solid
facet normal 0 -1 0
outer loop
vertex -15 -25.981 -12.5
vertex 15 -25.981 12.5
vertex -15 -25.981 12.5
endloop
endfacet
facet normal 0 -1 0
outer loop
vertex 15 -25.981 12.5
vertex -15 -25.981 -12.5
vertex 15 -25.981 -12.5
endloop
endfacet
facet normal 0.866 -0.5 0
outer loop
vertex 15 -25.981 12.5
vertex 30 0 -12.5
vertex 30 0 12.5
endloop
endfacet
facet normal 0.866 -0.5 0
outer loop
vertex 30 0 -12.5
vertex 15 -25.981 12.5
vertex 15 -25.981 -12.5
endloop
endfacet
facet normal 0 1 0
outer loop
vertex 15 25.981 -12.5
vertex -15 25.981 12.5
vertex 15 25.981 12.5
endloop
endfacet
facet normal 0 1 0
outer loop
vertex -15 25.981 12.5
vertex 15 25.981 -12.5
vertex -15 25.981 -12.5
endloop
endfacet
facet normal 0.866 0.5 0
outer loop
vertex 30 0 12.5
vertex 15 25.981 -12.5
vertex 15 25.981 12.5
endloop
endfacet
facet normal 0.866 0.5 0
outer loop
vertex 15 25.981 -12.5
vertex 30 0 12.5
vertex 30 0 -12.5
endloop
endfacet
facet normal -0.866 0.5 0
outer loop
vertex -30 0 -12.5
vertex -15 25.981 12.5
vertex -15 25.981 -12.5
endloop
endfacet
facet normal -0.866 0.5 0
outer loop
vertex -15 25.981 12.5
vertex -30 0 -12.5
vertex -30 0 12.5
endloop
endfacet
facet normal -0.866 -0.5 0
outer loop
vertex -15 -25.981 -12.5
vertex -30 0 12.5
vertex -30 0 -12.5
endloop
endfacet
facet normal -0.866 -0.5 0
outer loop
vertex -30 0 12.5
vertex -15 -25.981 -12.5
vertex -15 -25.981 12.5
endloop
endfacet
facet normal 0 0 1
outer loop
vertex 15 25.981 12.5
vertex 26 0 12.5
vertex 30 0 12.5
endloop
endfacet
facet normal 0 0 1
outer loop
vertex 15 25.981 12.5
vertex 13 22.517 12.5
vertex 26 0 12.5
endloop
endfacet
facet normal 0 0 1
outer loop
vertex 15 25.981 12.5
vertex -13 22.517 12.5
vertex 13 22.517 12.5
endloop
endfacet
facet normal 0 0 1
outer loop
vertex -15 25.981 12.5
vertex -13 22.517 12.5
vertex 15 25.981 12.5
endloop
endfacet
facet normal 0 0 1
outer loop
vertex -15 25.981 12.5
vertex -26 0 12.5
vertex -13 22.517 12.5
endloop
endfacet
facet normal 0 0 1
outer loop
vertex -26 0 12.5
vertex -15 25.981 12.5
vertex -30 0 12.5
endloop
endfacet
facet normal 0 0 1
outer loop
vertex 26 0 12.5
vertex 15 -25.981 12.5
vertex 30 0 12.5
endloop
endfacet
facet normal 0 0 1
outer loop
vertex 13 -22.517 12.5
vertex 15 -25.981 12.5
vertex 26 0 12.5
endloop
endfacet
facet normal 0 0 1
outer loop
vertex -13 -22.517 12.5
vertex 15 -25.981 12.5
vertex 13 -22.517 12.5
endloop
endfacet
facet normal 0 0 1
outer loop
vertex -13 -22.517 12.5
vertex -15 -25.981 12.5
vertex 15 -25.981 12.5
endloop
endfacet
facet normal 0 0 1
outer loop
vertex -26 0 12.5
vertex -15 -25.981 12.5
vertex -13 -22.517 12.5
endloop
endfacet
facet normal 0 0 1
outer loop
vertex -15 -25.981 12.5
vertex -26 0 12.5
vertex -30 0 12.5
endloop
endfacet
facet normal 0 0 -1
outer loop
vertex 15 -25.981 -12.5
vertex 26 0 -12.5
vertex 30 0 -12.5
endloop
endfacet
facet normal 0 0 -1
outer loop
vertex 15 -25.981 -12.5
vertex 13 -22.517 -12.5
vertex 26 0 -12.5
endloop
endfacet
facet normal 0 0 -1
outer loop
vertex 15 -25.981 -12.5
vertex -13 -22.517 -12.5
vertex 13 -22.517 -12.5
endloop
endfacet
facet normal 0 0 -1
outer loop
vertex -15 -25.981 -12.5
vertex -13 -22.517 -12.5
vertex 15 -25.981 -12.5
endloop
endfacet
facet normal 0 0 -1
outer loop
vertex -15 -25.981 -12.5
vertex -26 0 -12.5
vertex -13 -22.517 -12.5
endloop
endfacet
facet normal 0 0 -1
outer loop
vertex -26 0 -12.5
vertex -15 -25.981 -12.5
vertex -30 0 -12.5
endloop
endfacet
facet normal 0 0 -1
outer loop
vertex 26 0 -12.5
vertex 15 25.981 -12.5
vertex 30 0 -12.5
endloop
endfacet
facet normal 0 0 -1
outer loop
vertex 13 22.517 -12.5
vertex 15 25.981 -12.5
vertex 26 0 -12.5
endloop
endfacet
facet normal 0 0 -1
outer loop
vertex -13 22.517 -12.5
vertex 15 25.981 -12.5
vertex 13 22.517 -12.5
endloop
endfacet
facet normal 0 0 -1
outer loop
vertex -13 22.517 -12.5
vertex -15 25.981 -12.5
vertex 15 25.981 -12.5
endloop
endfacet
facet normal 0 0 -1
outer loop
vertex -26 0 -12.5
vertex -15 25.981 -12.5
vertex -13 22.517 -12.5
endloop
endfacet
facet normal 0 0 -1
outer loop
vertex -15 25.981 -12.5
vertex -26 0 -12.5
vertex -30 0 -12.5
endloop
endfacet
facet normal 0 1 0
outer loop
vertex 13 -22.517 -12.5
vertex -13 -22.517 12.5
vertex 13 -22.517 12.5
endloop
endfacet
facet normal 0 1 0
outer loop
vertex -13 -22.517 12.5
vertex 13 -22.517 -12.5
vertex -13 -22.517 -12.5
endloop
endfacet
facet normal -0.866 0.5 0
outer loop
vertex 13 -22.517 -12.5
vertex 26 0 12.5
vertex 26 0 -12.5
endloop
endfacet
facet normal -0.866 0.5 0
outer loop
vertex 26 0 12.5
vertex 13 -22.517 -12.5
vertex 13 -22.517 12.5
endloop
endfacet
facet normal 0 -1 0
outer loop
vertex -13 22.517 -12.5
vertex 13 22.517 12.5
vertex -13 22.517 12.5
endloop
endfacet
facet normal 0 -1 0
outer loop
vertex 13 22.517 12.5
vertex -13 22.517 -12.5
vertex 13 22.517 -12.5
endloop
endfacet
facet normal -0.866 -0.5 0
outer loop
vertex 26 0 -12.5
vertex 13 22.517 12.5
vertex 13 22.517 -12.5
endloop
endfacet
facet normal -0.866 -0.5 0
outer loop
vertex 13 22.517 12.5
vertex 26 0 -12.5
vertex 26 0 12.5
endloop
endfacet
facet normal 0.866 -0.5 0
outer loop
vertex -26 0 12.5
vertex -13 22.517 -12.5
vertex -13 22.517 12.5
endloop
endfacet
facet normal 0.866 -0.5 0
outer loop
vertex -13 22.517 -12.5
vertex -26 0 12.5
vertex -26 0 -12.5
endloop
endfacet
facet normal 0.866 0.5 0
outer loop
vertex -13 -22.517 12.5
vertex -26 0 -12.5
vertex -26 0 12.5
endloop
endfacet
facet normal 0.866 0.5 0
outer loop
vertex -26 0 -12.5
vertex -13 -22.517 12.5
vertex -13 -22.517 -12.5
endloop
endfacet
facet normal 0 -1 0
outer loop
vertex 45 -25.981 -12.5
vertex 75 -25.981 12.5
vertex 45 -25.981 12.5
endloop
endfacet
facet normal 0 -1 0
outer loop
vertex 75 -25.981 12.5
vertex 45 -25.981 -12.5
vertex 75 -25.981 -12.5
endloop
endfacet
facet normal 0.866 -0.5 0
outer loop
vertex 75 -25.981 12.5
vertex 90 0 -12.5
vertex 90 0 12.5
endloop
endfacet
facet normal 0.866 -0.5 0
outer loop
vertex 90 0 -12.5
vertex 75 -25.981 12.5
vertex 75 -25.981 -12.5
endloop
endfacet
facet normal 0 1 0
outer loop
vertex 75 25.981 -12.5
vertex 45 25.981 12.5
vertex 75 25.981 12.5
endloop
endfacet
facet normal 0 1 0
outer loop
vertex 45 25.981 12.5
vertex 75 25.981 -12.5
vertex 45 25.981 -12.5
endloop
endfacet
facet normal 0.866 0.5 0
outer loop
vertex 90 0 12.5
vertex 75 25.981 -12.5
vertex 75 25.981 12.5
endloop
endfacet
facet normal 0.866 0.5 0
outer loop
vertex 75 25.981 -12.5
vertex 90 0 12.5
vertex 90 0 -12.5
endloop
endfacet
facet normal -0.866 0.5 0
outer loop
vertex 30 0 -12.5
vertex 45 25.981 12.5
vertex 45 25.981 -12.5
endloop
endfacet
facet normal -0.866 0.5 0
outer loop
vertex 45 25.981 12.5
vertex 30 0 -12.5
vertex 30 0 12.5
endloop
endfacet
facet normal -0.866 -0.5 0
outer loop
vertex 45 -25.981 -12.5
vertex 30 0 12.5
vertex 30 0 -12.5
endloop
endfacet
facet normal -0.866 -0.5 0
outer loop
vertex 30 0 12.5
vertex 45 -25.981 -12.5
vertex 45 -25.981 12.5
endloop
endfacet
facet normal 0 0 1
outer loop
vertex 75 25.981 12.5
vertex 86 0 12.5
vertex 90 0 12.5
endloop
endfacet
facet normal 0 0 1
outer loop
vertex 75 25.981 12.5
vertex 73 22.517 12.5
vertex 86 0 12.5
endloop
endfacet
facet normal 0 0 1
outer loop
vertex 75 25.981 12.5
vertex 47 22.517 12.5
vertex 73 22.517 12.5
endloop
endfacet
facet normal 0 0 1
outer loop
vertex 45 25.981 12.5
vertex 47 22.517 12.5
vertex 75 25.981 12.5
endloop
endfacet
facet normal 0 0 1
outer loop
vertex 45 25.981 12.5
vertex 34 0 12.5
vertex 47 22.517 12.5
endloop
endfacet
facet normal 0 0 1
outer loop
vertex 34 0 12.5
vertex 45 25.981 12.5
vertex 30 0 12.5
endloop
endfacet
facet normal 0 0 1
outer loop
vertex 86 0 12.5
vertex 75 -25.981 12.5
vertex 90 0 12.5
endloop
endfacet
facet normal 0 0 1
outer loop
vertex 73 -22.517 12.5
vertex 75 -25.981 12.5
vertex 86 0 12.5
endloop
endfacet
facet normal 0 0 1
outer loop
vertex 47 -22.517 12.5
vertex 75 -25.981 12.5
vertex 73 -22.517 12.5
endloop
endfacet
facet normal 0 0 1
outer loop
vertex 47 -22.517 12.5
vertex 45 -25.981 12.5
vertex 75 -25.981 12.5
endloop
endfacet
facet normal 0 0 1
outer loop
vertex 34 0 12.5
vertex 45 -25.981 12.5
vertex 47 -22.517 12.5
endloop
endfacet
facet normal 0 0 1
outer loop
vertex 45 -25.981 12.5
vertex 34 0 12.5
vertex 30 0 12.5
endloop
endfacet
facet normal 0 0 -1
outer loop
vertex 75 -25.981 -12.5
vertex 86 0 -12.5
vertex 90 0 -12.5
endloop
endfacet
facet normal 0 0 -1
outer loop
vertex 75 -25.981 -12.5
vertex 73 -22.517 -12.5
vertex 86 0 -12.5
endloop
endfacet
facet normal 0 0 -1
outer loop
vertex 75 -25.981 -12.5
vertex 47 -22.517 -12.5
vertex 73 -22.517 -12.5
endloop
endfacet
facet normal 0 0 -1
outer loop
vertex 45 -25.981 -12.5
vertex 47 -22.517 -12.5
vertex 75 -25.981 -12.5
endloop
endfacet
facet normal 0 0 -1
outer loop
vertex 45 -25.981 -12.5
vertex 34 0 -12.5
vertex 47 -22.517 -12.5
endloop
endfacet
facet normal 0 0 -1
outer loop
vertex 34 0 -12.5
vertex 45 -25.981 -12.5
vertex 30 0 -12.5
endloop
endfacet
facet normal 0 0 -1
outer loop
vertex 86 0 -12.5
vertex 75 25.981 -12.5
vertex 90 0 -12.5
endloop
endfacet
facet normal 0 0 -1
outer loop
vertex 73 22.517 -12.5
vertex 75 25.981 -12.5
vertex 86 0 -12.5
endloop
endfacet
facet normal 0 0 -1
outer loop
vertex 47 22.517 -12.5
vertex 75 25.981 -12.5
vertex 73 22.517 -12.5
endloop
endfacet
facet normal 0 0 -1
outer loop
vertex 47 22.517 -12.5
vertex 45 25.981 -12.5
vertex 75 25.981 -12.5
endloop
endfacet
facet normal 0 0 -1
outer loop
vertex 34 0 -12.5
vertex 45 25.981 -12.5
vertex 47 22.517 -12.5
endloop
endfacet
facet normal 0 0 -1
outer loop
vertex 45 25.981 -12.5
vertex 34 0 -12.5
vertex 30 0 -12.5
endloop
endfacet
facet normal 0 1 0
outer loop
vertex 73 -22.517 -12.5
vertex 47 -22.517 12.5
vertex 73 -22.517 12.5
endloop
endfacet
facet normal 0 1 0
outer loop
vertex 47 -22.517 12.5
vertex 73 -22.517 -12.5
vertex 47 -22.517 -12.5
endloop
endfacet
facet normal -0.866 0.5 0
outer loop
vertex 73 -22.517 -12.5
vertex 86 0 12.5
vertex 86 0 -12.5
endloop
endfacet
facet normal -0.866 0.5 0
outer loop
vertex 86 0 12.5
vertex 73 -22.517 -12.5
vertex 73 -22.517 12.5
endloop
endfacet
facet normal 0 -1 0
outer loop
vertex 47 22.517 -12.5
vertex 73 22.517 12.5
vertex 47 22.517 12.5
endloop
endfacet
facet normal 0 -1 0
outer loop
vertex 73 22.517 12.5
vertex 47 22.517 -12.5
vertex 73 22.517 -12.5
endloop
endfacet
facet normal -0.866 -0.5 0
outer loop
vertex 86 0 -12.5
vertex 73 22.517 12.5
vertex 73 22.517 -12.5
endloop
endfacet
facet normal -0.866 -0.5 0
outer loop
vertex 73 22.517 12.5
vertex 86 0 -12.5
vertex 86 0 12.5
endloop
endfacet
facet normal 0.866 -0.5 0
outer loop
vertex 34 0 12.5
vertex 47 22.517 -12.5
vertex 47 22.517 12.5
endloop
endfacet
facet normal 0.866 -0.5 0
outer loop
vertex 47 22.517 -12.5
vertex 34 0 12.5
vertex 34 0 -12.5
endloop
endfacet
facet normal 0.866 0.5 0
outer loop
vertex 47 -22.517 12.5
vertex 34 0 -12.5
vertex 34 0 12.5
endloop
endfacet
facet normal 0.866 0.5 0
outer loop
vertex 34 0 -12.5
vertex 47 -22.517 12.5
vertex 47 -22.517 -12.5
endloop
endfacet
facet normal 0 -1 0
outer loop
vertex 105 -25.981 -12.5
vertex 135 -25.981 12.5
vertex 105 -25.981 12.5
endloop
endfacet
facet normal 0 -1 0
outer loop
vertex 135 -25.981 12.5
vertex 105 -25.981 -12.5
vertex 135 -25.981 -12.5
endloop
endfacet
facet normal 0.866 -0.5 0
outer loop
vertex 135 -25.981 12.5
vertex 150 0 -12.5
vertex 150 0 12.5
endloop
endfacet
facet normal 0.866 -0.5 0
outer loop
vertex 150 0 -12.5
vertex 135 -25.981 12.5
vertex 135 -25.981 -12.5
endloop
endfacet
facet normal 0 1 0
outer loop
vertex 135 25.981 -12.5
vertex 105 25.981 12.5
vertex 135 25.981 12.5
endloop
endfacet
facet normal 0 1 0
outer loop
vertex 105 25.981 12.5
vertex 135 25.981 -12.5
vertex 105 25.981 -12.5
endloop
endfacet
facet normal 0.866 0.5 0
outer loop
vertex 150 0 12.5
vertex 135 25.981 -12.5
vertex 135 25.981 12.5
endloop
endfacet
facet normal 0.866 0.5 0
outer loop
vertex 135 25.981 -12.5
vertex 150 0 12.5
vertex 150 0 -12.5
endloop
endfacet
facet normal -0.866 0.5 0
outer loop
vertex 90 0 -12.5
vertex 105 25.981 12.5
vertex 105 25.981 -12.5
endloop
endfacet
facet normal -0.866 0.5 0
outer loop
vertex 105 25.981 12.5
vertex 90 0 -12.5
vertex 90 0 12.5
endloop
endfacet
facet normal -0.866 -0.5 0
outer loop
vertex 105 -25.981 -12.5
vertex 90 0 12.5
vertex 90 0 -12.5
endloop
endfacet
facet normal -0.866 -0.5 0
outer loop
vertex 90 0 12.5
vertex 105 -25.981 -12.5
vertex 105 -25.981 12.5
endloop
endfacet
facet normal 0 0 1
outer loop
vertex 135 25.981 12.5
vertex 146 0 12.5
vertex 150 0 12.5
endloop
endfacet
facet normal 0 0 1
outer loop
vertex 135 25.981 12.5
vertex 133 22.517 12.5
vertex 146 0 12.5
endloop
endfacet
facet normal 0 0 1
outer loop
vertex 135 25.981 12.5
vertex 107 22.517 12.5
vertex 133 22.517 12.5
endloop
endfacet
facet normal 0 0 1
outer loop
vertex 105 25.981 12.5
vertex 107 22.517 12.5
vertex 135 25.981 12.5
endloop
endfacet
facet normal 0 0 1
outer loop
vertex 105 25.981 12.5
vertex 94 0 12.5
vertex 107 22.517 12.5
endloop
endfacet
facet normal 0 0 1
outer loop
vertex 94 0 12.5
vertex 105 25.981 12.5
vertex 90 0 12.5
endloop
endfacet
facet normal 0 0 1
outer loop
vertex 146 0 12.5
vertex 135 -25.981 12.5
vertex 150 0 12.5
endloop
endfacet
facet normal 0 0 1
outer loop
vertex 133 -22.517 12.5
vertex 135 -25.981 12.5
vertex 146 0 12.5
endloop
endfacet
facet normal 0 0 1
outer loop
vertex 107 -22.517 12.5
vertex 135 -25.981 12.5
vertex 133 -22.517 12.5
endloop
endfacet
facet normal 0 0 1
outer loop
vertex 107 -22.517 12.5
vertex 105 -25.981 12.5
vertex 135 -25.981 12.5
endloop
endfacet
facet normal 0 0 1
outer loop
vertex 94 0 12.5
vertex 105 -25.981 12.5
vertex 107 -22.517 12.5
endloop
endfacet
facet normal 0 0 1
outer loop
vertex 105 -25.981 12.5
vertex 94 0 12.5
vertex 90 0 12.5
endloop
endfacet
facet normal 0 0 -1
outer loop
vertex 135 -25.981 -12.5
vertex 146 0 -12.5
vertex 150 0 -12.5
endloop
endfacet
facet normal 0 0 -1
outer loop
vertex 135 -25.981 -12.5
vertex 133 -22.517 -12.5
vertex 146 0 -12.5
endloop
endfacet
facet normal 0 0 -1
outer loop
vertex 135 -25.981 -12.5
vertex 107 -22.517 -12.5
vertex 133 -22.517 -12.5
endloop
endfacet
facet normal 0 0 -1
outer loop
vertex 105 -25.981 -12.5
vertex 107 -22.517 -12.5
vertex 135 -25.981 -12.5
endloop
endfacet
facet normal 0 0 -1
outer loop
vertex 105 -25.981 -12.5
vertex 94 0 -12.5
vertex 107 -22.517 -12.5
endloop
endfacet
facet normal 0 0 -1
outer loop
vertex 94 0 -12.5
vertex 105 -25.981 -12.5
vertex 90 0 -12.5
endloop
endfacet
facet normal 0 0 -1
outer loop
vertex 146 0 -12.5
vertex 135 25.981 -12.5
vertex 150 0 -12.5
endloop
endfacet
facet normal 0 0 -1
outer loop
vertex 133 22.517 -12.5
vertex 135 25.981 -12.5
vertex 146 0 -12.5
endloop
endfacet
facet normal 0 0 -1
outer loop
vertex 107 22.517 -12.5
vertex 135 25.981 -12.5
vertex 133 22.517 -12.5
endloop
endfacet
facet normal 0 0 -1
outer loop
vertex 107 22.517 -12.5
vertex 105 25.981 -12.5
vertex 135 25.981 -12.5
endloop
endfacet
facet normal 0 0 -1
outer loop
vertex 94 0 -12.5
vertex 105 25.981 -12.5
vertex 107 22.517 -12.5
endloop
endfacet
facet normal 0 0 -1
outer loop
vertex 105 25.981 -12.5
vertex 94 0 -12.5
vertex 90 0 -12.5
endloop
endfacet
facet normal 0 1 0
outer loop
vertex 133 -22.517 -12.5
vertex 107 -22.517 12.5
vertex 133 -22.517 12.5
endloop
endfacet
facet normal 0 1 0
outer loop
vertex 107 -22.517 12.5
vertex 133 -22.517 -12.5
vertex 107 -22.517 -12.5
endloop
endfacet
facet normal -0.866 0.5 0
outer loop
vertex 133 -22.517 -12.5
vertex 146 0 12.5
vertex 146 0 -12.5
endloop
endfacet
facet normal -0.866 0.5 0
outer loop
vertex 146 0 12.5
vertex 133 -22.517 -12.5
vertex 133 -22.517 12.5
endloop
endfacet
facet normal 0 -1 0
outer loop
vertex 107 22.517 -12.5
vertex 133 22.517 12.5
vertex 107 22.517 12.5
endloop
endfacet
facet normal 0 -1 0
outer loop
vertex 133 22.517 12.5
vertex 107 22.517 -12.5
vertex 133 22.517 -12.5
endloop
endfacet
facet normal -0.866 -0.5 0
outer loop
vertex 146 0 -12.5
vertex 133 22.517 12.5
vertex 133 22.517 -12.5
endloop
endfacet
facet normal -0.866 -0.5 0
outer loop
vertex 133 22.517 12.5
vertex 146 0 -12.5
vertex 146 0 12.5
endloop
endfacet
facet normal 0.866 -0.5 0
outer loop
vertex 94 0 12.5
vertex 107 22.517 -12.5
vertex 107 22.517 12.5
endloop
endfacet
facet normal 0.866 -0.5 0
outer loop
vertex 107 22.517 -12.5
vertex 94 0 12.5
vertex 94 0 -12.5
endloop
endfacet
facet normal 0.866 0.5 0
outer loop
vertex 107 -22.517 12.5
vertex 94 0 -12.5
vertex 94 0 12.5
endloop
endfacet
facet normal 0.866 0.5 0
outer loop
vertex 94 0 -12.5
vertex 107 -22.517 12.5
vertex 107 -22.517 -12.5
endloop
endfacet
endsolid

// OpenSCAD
$fn = 100;

rounding_radius = 4;

module hexagon(radius, height) {
    cylinder(r=radius, h=height, $fn=6, center=true);
}

module hollow_hexagon(radius, height, wall_thickness) {
    difference() {
        hexagon(radius, height);
        hexagon(radius - wall_thickness, height * 2);
    }        
}

module hollow_hexagon_strip(radius, height, wall_thickness, count) {
    for(x = [0 : radius * 2 : radius * (count-1) * 2]) {
        translate([x, 0, 0]) {
           echo(x);
            hollow_hexagon(radius, height, wall_thickness);
        }
    }
}


// rounded_square(40, rounding_radius);
hollow_hexagon_strip(radius = 30, height = 25, wall_thickness = 4, count=3);
